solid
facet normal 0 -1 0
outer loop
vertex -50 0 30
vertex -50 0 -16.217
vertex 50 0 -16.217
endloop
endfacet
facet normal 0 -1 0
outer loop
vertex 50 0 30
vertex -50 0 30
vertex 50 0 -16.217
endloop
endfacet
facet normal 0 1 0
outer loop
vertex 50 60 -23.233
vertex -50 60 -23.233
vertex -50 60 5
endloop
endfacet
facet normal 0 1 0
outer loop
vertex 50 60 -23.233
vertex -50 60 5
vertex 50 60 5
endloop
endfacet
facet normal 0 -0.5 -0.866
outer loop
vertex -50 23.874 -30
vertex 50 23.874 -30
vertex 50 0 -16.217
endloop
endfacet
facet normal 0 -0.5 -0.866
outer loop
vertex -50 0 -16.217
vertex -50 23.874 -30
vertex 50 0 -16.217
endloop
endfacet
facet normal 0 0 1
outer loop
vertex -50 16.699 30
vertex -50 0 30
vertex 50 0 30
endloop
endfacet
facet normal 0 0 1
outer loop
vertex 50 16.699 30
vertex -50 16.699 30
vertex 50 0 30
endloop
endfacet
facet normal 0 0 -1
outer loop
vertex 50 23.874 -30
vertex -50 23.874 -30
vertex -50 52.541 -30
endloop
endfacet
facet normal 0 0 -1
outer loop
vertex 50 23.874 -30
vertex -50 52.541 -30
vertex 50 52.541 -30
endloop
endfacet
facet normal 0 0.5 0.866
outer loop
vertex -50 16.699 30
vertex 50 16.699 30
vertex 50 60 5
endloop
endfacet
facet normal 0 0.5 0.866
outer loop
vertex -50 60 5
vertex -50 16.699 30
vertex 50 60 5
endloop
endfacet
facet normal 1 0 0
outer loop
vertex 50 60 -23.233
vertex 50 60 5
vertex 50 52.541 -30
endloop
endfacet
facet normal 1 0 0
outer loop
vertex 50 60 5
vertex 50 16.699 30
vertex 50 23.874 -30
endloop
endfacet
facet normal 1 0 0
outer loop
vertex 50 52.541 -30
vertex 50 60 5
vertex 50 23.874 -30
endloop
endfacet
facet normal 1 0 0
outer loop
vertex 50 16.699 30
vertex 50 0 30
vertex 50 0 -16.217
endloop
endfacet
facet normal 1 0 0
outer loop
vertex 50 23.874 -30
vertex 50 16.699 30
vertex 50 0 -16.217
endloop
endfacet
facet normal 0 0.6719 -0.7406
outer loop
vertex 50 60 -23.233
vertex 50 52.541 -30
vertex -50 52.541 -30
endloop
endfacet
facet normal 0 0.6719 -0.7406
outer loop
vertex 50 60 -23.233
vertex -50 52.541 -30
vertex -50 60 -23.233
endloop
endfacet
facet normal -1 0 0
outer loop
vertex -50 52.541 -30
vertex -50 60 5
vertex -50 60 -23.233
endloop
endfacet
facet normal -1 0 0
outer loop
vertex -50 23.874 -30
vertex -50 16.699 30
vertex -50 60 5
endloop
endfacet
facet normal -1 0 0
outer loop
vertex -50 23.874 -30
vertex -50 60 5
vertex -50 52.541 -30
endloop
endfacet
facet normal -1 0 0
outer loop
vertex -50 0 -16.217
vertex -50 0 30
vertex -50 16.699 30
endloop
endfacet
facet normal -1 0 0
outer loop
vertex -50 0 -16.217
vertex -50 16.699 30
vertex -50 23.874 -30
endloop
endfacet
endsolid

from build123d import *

# Parameters (mm, degrees)
SKETCH1_W           = 100
SKETCH1_H           = 60
BOSS_EXTRUDE1_DEPTH = 60
CUT_EXTRUDE1_DEPTH  = 100


with BuildPart() as part:
    # Sketch1 → Boss-Extrude1 (new body)
    with BuildSketch(Plane(origin=(0, 0, 0), x_dir=(1, 0, 0), z_dir=(0, 1, 0))):
        Rectangle(SKETCH1_W, SKETCH1_H)
    extrude(amount=BOSS_EXTRUDE1_DEPTH)

    # Sketch2 → Cut-Extrude1 (cut)
    with BuildSketch(Plane(origin=(50, 0, 0), x_dir=(0, 0, -1), z_dir=(1, 0, 0))):
        Polygon((-30, 60), (-30, 16.698729811), (-5, 60), align=None)
        Polygon((30, 0), (30, 23.873553173), (16.216597649, 0), align=None)
        Polygon((23.232724571, 60), (30, 60), (30, 52.540618633), align=None)
    extrude(amount=-CUT_EXTRUDE1_DEPTH, mode=Mode.SUBTRACT)


solid = part.part
